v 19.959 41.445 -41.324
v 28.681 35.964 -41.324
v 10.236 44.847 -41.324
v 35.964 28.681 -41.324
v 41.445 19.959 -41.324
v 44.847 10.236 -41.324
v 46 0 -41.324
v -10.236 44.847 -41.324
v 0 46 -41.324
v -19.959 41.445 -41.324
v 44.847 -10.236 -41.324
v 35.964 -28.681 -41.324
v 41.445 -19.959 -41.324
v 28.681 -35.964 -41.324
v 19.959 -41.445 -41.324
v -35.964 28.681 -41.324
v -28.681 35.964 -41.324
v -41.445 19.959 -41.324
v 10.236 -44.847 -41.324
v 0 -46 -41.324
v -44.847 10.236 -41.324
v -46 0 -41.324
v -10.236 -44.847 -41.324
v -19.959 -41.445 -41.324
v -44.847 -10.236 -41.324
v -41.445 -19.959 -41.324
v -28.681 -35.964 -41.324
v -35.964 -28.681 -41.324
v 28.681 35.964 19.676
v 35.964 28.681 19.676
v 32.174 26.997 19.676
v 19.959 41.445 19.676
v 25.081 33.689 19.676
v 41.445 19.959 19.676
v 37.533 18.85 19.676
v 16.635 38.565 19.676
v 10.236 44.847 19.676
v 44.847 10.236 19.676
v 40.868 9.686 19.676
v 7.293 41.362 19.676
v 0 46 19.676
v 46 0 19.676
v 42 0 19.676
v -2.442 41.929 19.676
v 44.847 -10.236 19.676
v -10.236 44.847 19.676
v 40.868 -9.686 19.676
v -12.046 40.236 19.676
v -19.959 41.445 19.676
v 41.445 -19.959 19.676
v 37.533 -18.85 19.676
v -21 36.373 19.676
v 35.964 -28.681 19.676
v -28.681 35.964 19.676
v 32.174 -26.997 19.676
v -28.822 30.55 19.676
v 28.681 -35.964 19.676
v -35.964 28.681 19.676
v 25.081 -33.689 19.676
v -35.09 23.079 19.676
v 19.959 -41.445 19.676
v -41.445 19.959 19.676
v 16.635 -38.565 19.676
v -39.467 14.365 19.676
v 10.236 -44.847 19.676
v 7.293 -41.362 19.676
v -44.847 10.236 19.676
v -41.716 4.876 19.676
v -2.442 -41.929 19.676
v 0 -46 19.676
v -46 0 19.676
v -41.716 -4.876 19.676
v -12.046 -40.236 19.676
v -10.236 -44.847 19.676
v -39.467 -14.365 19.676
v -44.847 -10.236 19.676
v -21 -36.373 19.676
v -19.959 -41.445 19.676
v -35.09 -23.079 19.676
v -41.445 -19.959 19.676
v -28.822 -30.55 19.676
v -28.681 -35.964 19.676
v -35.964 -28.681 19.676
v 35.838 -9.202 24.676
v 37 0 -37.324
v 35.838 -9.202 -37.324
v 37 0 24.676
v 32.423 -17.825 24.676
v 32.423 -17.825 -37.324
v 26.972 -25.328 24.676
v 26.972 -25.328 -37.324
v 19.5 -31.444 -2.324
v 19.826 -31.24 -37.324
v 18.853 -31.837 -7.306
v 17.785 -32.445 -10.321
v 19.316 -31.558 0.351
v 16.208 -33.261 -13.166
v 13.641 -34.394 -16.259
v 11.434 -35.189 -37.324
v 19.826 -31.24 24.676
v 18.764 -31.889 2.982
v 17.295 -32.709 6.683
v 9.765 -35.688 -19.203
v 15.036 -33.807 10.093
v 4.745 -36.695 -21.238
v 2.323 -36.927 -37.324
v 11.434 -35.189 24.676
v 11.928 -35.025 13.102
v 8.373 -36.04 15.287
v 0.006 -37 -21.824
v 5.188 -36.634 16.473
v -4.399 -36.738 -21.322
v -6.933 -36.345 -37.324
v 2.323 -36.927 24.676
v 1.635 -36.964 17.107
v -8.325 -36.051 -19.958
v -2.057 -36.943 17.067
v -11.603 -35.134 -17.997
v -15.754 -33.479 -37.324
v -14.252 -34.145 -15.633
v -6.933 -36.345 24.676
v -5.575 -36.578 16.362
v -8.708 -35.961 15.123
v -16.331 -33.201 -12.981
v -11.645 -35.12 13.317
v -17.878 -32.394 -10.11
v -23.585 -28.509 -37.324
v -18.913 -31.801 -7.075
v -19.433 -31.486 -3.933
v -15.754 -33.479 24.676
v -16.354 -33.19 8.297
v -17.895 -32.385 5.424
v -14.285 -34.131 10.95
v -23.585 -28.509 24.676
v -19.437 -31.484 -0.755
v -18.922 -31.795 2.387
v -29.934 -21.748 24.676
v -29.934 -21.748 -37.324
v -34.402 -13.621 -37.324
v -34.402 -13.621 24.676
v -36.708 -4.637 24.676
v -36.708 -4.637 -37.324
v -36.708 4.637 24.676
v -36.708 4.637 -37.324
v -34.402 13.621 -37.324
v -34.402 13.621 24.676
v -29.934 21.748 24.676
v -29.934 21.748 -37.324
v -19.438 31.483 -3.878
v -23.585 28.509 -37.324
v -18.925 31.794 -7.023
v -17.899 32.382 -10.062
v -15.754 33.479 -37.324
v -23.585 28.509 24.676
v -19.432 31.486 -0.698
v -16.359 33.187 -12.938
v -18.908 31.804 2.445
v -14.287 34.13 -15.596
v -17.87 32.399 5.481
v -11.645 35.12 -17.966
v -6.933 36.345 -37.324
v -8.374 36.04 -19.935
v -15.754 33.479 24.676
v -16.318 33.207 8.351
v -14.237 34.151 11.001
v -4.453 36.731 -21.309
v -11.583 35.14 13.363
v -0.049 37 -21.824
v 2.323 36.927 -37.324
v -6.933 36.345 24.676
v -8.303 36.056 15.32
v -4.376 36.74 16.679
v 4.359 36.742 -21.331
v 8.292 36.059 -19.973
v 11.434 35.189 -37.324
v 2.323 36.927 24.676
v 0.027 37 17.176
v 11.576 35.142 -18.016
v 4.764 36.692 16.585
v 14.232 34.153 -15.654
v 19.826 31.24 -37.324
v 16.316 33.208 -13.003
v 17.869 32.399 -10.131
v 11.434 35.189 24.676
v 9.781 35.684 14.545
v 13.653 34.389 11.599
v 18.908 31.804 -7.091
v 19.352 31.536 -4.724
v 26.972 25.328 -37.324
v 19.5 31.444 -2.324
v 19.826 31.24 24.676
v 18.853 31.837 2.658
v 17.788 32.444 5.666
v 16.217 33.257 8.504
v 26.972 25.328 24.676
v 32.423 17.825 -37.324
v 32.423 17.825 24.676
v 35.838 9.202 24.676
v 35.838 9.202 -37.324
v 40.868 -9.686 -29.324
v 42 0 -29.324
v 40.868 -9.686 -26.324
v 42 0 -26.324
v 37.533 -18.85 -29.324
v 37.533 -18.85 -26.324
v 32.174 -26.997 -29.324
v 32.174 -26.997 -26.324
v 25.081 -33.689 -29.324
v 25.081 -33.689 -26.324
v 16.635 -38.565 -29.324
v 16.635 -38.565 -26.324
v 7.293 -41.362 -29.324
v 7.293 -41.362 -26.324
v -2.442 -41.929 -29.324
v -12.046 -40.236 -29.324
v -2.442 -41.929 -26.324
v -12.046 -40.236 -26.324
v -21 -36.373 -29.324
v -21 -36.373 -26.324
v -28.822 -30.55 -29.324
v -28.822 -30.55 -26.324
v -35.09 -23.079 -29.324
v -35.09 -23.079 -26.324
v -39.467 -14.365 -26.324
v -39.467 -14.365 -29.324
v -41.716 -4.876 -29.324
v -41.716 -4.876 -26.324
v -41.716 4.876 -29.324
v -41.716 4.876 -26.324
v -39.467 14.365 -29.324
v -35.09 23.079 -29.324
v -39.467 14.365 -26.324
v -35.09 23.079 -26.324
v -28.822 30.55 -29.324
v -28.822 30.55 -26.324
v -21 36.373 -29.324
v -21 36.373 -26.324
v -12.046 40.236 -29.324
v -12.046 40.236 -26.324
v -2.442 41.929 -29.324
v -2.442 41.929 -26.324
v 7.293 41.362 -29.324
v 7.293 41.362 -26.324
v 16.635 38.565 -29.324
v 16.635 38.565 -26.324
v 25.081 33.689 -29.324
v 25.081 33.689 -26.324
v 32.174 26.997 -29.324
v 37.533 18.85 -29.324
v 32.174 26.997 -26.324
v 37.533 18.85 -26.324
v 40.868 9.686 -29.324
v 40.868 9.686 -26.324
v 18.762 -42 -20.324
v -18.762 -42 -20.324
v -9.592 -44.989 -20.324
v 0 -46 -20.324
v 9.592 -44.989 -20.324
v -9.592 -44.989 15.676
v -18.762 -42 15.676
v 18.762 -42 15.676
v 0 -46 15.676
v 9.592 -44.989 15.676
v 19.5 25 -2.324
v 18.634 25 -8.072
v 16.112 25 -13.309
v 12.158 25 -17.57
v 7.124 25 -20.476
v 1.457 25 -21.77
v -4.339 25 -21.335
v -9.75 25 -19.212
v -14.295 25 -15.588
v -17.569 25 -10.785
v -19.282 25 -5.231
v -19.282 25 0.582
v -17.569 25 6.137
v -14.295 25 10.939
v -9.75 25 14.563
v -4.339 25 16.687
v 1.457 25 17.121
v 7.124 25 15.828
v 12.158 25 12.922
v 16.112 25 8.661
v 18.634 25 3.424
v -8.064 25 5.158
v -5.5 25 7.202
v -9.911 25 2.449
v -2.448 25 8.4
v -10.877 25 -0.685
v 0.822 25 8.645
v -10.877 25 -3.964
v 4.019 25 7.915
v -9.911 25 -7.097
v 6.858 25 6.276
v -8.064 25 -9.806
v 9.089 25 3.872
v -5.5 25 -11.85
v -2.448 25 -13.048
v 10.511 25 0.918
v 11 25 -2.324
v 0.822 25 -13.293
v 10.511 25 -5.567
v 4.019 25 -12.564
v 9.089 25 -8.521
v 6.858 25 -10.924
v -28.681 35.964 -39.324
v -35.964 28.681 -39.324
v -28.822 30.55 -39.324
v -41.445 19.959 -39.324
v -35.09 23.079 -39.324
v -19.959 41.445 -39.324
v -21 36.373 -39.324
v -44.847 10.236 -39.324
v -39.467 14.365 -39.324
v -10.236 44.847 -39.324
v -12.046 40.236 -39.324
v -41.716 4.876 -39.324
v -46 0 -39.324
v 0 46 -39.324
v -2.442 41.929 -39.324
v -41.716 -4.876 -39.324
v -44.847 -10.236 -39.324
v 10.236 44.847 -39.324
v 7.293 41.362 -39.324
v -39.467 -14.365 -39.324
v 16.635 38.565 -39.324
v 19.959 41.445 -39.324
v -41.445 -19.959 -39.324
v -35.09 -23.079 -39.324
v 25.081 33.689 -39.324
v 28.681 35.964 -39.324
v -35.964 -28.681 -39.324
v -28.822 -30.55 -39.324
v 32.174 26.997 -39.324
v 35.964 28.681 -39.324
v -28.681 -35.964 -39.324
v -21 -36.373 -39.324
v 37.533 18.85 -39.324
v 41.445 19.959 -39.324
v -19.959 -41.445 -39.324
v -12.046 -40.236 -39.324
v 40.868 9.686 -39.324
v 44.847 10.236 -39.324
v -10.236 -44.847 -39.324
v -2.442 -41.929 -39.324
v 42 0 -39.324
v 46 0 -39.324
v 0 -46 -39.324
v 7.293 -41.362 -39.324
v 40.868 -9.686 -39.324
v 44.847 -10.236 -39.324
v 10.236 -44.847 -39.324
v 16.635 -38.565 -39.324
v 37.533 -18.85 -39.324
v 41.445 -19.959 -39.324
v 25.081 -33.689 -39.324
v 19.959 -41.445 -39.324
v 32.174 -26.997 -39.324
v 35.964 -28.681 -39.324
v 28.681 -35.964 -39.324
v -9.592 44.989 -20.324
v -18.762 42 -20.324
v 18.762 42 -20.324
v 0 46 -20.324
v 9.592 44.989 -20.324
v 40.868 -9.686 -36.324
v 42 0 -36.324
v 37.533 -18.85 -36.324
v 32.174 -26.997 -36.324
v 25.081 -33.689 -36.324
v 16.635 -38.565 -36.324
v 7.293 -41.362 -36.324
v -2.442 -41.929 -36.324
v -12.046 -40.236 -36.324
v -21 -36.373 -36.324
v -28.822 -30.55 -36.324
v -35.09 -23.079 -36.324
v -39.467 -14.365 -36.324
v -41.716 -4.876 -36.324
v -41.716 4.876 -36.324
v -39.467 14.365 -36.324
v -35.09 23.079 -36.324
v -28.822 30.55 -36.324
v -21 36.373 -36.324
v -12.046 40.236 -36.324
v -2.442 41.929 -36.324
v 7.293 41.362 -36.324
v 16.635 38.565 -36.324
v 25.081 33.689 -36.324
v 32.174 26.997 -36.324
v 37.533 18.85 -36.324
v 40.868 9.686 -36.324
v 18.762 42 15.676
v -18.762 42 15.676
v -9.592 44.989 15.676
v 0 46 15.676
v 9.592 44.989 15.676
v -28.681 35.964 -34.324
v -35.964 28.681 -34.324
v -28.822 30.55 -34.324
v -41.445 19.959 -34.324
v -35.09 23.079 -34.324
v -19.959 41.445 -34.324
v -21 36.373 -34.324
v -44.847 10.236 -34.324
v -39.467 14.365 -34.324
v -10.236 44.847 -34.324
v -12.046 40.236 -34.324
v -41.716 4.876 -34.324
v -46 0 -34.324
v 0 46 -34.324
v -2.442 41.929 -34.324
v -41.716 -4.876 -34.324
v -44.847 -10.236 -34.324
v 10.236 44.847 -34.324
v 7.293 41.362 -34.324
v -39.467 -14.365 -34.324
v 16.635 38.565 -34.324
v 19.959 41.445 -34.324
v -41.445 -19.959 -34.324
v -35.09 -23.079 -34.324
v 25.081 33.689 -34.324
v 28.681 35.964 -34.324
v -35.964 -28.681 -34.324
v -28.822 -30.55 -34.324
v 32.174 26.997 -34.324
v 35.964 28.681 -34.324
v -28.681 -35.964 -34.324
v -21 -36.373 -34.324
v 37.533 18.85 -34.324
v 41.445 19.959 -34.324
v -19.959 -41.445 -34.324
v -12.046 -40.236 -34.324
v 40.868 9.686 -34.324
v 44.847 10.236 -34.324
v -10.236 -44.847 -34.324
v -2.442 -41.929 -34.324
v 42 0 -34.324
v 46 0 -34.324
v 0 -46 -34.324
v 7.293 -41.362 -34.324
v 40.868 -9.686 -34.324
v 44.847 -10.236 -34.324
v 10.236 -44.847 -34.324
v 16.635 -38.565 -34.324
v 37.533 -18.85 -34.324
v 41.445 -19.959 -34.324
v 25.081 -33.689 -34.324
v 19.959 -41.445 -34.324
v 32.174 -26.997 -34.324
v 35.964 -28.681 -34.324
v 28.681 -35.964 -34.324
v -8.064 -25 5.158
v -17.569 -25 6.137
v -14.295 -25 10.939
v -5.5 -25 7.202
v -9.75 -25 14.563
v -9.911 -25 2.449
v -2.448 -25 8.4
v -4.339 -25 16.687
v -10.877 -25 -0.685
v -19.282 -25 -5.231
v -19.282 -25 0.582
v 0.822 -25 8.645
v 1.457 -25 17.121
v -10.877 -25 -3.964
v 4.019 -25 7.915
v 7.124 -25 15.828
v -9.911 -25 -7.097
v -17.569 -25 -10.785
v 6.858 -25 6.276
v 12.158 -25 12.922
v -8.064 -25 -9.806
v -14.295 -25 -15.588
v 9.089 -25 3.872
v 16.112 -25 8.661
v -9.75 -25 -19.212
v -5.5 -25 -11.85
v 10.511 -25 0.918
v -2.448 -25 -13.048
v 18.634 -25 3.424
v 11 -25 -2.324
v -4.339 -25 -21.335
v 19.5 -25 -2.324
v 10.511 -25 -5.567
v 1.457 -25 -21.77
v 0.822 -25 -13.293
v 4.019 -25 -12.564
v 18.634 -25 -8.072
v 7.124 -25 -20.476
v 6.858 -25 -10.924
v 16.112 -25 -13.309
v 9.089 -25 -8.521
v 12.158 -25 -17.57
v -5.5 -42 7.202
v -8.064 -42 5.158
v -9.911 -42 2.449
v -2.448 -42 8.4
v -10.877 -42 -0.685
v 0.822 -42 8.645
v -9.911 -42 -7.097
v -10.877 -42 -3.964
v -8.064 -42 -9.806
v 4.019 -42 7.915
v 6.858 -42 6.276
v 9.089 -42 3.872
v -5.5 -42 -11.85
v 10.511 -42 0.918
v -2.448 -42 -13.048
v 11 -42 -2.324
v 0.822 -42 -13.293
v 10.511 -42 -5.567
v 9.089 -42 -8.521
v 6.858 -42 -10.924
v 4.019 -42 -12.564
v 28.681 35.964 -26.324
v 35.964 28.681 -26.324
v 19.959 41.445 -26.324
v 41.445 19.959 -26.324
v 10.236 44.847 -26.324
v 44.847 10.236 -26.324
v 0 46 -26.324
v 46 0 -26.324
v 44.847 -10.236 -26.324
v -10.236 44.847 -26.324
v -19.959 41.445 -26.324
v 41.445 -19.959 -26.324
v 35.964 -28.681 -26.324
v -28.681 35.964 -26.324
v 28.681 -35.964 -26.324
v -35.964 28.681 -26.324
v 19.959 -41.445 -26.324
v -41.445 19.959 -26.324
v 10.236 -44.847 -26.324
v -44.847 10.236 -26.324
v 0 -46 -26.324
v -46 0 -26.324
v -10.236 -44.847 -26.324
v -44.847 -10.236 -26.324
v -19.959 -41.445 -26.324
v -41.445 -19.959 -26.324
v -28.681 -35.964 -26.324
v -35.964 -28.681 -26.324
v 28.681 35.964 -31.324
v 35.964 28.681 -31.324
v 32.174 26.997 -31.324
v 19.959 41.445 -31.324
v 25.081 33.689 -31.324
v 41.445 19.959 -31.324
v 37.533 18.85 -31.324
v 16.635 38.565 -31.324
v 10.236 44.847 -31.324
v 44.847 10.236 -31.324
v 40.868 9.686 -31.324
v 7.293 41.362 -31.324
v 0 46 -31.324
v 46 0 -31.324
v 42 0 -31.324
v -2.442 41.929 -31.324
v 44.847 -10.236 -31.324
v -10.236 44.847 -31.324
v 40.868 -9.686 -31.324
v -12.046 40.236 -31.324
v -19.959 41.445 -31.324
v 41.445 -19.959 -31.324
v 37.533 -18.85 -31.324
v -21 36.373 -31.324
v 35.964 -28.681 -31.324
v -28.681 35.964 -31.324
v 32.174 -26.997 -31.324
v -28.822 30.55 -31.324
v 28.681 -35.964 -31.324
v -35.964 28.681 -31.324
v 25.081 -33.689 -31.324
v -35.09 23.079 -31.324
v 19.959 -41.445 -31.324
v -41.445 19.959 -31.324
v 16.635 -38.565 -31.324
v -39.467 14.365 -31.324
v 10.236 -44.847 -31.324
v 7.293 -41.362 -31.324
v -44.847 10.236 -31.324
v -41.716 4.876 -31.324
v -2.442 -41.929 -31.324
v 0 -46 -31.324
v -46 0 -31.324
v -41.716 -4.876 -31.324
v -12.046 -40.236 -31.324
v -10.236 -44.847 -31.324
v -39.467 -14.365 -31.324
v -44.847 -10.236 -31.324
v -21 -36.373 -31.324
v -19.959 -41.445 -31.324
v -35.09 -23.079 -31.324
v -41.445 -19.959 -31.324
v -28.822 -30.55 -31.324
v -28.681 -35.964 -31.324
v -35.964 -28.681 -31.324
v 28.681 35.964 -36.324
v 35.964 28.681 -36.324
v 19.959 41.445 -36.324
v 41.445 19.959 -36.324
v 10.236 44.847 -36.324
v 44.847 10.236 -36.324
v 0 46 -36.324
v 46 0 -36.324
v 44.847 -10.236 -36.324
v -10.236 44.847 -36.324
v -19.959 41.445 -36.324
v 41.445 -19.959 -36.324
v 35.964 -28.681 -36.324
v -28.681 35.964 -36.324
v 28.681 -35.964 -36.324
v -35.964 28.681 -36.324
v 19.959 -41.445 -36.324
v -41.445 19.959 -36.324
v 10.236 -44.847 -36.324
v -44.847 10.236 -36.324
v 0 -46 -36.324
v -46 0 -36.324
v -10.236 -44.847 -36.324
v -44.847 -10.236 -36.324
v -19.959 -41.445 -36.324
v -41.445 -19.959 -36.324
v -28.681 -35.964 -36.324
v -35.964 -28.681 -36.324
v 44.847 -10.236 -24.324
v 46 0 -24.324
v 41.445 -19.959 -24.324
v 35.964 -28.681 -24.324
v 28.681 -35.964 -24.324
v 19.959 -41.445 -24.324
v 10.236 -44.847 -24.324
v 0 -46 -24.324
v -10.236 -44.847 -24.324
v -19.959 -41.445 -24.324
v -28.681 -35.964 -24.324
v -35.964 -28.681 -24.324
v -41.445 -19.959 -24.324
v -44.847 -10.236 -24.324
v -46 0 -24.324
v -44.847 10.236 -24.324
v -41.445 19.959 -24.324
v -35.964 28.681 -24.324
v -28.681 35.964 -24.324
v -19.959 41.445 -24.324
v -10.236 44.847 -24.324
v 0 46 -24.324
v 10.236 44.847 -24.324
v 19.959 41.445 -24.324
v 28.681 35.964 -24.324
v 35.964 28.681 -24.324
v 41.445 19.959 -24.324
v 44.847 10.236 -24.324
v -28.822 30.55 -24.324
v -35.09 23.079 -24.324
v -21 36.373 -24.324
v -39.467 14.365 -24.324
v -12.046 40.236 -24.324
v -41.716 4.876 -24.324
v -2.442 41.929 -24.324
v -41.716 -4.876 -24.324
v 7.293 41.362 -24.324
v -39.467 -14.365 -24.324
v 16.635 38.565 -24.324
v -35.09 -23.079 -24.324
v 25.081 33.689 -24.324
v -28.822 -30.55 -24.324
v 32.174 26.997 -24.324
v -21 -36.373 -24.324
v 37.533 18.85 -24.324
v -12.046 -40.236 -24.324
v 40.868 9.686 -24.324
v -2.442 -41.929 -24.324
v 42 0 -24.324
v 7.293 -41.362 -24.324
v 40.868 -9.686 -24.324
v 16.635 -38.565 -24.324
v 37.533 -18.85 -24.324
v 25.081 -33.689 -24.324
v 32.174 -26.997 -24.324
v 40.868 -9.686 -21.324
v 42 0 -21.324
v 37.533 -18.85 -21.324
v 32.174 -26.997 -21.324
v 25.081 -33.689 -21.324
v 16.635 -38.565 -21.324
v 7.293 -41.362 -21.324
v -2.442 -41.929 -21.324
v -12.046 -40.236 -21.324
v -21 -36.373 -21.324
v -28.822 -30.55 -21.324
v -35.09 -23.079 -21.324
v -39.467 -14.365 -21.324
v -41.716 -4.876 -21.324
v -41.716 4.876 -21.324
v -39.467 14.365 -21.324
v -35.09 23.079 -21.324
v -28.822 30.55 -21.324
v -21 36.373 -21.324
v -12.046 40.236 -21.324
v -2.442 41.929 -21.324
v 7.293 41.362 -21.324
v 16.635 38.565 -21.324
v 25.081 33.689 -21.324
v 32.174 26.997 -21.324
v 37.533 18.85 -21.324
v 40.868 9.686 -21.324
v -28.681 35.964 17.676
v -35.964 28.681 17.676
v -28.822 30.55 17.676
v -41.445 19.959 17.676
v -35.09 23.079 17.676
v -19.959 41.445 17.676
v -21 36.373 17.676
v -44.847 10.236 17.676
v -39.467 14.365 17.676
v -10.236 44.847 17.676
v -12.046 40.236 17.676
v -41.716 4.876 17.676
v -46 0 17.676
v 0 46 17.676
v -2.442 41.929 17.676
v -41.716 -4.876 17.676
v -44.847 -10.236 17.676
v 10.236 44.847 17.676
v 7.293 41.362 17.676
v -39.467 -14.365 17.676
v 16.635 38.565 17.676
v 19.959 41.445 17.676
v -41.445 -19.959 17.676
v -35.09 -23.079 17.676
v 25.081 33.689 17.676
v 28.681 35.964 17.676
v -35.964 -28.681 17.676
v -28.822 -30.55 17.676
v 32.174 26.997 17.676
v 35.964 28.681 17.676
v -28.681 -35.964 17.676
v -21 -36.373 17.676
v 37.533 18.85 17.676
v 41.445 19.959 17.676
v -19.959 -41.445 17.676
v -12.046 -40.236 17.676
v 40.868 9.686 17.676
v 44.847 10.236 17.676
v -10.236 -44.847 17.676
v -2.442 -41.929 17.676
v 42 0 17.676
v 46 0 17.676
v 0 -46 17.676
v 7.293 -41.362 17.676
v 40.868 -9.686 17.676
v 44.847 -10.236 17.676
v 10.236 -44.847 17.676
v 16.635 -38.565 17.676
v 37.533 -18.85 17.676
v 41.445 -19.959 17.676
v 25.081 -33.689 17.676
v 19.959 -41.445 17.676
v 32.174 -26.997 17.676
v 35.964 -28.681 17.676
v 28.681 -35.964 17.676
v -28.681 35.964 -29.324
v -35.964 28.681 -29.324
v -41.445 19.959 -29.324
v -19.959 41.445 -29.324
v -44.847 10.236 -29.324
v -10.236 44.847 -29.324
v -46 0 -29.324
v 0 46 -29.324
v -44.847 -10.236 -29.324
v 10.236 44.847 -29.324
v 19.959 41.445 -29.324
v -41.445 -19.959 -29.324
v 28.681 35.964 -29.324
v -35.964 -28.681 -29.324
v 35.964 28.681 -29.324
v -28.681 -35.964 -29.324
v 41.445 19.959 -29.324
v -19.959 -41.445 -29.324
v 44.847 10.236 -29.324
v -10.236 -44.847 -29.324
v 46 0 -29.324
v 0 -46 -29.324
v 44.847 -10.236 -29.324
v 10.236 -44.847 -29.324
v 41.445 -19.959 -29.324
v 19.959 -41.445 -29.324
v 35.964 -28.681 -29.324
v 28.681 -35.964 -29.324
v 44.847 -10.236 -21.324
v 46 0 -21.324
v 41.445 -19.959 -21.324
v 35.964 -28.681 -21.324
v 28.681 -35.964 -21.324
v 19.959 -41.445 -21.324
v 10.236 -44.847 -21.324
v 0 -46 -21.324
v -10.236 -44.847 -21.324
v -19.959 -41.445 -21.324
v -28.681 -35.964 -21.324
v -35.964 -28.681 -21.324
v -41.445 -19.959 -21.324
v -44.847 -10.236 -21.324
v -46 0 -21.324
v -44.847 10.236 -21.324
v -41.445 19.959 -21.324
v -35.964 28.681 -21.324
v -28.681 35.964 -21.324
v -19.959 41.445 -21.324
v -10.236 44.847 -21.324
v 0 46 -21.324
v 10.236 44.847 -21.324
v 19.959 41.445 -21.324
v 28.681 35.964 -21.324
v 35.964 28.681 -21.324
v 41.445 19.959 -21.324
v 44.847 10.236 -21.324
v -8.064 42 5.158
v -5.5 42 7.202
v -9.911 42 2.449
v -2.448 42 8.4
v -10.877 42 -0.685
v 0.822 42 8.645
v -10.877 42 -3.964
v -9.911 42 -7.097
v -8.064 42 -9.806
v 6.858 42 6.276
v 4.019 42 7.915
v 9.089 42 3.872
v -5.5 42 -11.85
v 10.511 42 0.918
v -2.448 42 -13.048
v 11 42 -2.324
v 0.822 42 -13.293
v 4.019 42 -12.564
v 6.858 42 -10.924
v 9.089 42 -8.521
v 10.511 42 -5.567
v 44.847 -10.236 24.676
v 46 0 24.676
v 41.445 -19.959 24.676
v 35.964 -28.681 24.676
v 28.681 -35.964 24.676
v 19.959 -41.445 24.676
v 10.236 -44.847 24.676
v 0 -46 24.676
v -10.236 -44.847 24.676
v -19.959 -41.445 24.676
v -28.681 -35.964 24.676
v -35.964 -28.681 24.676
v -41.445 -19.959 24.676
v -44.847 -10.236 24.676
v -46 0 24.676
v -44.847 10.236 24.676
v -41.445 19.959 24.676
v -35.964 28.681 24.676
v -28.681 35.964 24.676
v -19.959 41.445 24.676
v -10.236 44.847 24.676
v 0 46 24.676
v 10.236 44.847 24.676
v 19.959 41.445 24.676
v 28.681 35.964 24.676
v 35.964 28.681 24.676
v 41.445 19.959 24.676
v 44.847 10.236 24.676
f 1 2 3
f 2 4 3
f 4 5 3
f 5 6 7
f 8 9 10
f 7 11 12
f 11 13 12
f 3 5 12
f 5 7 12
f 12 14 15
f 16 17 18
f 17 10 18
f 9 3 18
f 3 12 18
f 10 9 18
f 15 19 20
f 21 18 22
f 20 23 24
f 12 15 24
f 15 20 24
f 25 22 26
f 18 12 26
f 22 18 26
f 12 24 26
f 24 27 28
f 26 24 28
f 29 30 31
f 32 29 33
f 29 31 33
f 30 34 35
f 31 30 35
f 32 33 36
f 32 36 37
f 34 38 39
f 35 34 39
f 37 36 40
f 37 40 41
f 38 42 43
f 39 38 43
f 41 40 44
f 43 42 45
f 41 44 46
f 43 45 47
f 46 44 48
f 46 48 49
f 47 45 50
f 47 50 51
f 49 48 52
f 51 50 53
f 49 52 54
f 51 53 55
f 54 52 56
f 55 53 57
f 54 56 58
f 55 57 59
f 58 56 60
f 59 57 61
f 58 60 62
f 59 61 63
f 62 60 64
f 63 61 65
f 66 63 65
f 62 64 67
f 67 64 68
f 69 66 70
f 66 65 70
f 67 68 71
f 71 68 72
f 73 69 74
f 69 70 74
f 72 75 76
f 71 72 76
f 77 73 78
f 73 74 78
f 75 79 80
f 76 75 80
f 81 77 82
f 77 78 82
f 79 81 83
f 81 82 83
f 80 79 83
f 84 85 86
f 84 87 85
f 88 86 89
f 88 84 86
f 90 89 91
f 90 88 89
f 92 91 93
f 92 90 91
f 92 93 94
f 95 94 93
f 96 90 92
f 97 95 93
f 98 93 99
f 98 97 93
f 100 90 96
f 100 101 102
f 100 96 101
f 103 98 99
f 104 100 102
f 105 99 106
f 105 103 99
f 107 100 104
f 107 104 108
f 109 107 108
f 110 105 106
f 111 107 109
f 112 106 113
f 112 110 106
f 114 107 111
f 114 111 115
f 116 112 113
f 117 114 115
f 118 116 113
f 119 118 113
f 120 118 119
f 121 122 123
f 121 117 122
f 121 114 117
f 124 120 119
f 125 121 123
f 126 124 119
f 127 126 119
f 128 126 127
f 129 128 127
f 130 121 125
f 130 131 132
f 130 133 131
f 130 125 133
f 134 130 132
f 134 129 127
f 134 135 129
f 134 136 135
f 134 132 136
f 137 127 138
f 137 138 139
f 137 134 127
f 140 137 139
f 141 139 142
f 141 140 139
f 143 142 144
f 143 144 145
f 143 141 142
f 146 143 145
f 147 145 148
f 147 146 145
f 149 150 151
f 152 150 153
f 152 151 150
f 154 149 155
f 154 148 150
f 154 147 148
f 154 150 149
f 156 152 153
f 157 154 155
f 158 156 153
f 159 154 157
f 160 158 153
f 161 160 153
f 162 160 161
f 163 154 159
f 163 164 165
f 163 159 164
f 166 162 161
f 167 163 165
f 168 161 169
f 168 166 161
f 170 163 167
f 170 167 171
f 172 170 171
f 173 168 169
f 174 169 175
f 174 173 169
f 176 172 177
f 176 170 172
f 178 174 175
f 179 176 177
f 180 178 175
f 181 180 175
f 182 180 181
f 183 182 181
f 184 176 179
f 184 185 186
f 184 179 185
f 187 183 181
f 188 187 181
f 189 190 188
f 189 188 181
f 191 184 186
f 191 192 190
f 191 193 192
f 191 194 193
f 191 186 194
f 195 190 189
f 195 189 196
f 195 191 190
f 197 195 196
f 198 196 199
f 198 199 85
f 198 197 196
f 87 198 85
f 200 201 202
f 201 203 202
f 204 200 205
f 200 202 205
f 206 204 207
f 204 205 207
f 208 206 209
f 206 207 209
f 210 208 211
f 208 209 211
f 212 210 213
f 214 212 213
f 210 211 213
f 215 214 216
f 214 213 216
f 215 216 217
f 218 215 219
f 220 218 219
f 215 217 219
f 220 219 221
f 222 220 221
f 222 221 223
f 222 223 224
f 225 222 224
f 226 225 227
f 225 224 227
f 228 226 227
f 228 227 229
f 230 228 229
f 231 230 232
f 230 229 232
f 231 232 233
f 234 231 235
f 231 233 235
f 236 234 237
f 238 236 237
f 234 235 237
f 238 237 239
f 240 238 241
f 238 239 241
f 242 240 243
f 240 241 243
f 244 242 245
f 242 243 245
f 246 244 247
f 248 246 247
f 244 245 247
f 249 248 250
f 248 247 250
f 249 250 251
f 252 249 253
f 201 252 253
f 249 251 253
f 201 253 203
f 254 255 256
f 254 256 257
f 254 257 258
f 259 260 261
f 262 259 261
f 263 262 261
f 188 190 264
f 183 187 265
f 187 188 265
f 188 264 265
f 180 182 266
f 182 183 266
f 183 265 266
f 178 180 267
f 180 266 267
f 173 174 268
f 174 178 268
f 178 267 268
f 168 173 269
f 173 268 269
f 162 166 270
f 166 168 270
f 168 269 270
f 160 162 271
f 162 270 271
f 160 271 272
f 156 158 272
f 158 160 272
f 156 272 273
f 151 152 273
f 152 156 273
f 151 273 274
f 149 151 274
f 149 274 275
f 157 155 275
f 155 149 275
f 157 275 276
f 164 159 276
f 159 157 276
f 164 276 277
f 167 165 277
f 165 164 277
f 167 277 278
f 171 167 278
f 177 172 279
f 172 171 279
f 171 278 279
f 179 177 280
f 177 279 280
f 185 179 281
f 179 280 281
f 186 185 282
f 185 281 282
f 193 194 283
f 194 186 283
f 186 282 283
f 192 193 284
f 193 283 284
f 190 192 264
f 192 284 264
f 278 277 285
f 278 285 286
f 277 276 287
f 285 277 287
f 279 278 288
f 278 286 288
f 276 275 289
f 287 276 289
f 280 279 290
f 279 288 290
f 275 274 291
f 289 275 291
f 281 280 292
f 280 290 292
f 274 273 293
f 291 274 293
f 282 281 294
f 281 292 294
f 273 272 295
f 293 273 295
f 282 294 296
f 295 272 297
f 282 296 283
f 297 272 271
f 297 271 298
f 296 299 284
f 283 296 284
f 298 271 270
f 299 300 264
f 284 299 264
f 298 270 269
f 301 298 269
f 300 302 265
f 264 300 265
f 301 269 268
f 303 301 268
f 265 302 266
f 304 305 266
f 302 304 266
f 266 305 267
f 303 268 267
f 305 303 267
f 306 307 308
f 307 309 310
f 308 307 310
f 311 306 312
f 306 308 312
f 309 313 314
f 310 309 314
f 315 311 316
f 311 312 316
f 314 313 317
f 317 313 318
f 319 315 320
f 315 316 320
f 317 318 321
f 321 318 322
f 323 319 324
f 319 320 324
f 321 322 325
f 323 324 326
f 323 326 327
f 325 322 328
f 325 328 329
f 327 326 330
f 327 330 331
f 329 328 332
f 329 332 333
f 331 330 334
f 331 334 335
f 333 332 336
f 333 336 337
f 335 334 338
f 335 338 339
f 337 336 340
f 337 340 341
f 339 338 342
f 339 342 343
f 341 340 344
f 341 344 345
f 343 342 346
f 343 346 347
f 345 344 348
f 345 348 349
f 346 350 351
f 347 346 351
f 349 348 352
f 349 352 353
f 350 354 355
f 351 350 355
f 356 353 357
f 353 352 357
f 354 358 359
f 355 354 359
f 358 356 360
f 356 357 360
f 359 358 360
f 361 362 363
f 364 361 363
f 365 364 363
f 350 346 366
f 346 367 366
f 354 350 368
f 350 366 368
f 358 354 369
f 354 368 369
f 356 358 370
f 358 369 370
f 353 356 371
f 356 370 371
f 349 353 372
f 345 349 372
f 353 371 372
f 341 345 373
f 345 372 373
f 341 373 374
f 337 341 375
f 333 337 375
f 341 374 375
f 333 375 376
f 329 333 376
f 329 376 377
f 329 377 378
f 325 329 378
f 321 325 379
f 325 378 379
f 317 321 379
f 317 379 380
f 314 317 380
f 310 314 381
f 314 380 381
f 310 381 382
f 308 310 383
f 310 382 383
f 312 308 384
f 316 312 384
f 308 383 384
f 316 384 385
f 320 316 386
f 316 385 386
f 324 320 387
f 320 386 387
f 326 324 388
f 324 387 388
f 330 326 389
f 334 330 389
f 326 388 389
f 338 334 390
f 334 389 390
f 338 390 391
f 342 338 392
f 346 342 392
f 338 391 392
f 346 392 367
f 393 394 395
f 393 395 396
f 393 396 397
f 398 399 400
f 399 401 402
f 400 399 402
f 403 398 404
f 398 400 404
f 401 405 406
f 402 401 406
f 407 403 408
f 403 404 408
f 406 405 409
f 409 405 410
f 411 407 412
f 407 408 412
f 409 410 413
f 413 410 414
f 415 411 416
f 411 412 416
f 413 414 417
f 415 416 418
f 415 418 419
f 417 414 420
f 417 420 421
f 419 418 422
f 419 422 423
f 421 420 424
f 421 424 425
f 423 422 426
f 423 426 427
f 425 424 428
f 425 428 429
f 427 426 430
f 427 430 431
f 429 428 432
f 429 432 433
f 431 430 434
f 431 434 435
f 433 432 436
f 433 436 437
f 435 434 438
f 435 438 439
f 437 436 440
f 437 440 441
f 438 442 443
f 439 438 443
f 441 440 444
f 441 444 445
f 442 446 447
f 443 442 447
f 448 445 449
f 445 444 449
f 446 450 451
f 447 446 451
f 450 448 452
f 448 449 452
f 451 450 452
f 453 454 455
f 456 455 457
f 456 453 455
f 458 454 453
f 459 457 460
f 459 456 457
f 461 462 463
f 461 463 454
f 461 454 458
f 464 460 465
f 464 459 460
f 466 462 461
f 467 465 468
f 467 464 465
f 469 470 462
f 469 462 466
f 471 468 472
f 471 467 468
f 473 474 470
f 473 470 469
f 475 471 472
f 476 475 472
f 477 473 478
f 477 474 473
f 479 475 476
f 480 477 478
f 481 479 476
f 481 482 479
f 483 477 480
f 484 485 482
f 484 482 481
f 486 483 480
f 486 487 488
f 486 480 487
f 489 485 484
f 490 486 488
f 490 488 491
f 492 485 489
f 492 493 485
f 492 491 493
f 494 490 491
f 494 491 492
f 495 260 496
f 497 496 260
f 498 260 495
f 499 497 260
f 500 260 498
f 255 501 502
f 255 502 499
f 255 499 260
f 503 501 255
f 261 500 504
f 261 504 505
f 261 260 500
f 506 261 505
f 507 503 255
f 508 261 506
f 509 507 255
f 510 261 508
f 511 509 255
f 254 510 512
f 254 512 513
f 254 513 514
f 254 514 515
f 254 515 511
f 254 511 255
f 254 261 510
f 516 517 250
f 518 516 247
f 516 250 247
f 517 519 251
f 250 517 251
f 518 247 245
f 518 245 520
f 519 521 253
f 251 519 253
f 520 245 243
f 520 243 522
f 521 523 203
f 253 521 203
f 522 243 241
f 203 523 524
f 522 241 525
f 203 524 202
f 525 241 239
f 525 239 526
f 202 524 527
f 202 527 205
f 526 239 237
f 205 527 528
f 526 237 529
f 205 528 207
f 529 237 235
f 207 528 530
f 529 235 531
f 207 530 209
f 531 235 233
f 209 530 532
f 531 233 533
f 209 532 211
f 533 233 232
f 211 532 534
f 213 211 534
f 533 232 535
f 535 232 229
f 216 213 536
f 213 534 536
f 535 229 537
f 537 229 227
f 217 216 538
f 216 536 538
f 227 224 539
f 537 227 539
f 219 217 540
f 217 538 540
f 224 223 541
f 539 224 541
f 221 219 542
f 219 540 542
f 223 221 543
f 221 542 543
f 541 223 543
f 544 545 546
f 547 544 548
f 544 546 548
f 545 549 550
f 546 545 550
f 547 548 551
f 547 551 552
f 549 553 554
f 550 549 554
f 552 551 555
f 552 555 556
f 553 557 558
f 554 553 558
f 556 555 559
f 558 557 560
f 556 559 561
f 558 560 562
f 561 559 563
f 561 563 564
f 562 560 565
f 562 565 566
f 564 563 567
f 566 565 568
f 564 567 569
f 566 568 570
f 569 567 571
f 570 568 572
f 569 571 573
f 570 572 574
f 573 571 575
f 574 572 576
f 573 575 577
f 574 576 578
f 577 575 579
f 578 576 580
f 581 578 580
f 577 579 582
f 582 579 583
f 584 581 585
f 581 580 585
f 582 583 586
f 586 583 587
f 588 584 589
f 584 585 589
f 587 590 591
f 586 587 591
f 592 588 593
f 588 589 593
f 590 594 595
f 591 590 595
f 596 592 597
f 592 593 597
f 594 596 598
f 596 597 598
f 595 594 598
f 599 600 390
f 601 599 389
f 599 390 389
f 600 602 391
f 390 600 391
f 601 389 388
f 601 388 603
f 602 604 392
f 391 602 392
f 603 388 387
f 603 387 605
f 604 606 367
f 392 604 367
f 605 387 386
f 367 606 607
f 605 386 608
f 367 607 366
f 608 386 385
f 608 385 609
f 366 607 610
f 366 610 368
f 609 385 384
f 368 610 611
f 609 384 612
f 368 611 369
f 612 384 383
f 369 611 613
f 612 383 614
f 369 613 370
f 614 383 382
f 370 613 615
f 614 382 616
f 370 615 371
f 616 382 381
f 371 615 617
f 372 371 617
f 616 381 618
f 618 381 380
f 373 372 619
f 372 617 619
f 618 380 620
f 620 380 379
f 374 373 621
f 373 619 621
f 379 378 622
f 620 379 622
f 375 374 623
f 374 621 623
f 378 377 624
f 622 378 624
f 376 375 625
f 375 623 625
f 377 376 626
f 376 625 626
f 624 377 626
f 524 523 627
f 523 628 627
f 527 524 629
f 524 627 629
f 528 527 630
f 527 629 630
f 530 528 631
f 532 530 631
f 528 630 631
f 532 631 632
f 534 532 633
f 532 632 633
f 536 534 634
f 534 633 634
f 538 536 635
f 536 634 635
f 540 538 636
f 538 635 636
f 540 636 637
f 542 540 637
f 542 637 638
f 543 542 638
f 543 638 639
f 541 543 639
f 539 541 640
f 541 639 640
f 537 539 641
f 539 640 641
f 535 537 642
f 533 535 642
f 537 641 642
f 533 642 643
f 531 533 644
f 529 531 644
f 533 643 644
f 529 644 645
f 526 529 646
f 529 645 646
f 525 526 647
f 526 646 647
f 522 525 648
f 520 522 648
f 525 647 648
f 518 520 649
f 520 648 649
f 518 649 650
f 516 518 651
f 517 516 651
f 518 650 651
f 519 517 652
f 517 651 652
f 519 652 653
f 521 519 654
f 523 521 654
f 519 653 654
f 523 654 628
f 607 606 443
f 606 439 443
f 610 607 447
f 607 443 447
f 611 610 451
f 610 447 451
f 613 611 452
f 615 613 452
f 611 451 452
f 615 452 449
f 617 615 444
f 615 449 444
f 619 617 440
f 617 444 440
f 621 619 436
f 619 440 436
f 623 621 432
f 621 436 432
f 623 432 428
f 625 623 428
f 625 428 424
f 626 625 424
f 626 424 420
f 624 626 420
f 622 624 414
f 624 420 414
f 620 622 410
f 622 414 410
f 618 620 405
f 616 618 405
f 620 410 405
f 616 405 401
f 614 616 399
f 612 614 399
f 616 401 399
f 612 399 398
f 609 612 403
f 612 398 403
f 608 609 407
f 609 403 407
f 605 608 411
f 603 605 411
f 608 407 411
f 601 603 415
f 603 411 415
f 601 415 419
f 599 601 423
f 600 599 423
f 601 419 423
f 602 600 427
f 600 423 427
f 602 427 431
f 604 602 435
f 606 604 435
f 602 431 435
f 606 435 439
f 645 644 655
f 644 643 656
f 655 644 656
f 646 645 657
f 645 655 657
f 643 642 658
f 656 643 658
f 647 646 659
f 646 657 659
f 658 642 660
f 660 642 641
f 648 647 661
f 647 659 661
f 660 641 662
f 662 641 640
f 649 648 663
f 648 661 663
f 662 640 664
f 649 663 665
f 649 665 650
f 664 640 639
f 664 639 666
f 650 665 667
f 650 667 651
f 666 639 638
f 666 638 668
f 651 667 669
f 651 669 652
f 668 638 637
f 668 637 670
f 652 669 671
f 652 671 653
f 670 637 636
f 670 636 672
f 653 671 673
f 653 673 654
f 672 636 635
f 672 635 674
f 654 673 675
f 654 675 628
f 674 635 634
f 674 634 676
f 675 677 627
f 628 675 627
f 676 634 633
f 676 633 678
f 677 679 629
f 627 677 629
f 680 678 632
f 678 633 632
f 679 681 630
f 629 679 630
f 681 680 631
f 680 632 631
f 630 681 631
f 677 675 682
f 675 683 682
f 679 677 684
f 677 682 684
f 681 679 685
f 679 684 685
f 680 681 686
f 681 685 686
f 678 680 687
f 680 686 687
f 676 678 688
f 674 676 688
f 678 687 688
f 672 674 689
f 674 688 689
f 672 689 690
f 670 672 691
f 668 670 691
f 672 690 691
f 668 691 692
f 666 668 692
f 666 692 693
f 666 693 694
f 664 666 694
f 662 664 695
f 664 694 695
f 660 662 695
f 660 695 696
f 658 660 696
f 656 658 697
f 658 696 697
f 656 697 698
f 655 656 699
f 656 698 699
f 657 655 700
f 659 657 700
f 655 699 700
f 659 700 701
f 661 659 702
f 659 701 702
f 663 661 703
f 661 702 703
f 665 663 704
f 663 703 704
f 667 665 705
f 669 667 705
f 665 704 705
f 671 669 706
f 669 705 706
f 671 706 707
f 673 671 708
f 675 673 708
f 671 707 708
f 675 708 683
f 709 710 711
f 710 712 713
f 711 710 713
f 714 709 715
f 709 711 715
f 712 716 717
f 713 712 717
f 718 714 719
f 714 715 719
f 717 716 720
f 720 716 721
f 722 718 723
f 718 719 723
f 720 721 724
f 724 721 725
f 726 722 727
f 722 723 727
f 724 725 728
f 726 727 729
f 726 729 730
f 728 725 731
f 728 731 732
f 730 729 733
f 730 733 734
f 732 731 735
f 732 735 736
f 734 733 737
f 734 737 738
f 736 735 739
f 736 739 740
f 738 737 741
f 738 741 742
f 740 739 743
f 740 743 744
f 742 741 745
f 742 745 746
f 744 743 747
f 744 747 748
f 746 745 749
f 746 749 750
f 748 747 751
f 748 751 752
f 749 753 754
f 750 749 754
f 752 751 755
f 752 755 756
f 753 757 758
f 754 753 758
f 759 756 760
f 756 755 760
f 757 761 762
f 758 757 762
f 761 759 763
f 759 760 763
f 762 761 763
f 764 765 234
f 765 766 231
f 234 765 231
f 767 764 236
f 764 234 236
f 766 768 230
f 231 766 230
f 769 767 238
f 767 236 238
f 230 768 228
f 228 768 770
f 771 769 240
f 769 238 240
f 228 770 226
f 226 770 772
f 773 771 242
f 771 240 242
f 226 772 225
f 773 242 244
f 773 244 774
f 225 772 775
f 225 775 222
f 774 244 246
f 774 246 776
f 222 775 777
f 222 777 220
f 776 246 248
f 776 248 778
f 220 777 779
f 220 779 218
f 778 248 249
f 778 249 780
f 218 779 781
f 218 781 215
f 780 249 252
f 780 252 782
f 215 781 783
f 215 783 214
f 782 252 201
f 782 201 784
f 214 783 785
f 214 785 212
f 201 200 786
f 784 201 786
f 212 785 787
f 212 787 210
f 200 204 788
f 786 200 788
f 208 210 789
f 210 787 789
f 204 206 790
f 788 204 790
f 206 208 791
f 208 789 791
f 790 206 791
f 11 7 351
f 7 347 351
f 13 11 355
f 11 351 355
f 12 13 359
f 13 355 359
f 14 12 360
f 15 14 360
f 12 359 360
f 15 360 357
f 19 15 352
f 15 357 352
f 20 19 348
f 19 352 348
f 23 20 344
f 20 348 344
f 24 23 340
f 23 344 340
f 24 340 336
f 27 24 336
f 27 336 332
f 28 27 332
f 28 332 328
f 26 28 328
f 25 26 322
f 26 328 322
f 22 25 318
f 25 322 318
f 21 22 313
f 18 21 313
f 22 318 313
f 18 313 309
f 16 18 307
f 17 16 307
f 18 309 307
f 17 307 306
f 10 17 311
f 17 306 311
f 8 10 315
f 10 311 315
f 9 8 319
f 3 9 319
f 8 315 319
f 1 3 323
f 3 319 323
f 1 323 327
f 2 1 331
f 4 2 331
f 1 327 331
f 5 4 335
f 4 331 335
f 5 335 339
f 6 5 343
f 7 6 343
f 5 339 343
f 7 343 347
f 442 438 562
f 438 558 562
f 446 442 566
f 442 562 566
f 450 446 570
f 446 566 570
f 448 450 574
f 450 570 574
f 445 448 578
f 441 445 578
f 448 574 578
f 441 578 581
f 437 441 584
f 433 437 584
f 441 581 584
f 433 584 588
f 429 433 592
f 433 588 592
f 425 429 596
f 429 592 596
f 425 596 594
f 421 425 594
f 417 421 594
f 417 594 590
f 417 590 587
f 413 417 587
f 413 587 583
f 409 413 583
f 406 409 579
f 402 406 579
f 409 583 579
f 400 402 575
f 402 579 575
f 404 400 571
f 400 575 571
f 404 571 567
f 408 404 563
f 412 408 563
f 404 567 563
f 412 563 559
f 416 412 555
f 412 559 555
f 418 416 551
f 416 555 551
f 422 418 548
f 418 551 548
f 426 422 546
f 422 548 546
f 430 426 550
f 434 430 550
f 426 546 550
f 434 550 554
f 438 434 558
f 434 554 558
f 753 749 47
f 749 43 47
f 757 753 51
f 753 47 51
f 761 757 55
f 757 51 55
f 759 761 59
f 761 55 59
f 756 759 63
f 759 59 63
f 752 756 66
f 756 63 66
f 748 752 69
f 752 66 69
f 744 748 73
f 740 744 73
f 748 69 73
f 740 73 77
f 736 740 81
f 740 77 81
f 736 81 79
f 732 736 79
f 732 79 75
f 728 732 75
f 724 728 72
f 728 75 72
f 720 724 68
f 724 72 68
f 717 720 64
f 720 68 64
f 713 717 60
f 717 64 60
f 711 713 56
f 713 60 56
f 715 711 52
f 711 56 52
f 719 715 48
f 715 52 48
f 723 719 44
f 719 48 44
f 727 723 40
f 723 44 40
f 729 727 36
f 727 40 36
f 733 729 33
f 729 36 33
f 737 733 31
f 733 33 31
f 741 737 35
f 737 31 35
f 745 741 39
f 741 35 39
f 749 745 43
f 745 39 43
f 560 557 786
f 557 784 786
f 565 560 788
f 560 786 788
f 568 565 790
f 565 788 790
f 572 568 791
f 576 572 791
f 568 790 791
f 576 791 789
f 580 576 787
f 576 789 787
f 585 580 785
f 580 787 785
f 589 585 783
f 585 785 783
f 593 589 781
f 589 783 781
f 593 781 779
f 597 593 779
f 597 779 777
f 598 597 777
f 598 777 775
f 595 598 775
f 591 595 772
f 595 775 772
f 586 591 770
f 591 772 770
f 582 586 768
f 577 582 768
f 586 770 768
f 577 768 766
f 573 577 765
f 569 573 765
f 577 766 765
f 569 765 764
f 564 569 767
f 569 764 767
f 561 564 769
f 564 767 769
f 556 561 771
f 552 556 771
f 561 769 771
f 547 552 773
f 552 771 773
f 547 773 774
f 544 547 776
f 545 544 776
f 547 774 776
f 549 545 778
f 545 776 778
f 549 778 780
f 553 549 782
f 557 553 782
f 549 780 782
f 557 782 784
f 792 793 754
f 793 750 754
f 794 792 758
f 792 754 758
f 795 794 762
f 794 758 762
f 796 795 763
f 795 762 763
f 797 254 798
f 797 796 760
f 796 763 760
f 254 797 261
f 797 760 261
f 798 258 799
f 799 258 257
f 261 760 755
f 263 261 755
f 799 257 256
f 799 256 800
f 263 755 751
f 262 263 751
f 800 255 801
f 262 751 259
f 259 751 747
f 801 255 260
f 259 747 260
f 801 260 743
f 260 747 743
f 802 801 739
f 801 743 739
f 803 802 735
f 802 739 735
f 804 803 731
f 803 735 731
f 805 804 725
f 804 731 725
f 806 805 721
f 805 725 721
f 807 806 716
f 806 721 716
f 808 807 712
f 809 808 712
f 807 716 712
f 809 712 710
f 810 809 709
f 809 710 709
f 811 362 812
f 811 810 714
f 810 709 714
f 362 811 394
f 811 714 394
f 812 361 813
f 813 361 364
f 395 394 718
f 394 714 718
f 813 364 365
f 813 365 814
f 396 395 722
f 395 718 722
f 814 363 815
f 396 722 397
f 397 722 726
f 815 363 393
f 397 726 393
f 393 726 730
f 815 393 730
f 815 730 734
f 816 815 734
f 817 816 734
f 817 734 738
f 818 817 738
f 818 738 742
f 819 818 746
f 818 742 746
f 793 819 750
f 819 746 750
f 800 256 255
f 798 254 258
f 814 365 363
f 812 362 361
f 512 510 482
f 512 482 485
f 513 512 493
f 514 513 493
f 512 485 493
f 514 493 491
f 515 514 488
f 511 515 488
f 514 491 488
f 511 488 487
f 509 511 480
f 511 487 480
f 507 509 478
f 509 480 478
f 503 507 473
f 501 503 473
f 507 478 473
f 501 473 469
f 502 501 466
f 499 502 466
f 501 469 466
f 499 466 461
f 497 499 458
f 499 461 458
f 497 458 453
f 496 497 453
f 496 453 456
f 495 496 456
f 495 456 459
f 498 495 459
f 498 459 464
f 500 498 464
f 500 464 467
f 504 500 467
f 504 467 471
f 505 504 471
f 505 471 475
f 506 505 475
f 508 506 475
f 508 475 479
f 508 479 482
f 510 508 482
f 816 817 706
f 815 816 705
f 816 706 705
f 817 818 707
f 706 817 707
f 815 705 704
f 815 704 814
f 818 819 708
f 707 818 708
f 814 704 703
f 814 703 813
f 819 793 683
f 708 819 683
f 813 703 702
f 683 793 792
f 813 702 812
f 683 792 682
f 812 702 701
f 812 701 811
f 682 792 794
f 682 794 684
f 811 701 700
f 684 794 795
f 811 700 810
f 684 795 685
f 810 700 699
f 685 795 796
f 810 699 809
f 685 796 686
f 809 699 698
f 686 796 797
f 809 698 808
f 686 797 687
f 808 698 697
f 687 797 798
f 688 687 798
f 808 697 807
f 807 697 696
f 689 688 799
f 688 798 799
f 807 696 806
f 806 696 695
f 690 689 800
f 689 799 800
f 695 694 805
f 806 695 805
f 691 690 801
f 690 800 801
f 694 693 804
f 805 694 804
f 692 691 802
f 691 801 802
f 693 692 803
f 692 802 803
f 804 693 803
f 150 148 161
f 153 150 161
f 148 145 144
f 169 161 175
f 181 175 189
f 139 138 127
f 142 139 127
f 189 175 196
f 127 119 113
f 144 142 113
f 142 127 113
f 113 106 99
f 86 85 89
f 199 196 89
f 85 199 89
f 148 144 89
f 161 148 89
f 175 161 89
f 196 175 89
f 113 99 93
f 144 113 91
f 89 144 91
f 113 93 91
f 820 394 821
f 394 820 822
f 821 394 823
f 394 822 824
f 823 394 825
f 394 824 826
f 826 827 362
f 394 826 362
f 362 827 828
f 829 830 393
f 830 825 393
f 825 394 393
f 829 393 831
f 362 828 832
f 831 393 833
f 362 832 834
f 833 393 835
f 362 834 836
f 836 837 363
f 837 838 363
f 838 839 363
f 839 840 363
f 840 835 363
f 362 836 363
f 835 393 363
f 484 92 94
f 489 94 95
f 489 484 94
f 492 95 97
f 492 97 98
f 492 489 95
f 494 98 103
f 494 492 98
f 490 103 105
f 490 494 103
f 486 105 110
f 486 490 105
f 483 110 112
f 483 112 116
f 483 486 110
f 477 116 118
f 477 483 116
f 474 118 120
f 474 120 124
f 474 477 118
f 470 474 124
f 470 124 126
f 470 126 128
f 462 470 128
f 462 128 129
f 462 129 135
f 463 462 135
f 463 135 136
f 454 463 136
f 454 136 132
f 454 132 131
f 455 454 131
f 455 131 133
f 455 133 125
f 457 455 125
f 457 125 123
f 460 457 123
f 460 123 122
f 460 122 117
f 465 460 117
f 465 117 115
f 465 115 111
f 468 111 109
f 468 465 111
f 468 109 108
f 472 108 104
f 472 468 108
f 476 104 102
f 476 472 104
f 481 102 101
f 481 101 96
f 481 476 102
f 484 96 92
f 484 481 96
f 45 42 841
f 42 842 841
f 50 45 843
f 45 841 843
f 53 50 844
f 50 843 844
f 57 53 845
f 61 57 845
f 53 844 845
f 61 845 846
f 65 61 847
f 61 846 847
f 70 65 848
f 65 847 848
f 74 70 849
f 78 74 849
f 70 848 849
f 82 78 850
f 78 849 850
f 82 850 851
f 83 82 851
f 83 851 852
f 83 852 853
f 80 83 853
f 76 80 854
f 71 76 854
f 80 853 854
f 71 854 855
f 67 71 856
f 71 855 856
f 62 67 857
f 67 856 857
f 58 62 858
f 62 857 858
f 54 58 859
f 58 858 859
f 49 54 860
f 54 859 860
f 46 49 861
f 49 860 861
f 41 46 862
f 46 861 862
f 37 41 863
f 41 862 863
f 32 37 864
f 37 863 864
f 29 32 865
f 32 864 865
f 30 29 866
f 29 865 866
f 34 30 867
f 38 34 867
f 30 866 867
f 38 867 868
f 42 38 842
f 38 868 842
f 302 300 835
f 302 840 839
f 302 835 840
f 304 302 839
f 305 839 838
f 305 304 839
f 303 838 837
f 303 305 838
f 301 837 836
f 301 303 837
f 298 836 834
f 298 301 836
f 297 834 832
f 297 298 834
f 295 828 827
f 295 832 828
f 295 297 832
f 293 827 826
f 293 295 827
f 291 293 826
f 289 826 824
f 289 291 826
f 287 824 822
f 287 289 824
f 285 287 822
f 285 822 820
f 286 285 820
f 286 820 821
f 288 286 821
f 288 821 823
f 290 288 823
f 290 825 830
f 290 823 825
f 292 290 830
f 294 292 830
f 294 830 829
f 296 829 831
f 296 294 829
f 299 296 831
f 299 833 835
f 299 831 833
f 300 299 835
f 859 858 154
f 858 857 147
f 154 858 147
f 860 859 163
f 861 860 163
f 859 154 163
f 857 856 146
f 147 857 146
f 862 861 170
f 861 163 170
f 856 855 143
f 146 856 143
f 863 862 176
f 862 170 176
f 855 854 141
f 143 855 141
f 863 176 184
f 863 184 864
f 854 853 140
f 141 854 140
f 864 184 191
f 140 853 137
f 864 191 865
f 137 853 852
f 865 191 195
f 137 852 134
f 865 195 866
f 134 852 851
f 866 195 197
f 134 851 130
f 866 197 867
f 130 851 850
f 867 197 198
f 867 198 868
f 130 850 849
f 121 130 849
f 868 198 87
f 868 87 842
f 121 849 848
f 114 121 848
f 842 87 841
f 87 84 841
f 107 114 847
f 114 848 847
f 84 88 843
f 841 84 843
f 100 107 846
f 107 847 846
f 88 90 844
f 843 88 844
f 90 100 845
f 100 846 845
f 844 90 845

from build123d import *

# Parameters (mm, degrees)
SKETCH2_R               = 19.5
BOSS_EXTRUDE1_DEPTH     = 12
SKETCH3_R               = 11
CUT_EXTRUDE2_DEPTH      = 47
CUT_EXTRUDE2_DEPTH_BACK = 47
SKETCH7_W               = 36
SKETCH7_H               = 8
CUT_EXTRUDE4_DEPTH      = 47.0000001


with BuildPart() as part:
    # Sketch1 → Revolve1 (revolve)
    with BuildSketch(Plane(origin=(0, 0, 0), x_dir=(1, 0, 0), z_dir=(0, 1, 0))):
        Polygon((0, 41.324206049), (46, 41.324206049), (46, 39.324206049), (42, 39.324206049), (42, 36.324206049), (46, 36.324206049), (46, 34.324206049), (42, 34.324206049), (42, 31.324206049), (46, 31.324206049), (46, 29.324206049), (42, 29.324206049), (42, 26.324206049), (46, 26.324206049), (46, 24.324206049), (42, 24.324206049), (42, 21.324206049), (46, 21.324206049), (46, -17.675793951), (42, -17.675793951), (42, -19.675793951), (46, -19.675793951), (46, -24.675793951), (37, -24.675793951), (37, 22.858692986), (37, 37.324206049), (0, 37.324206049), align=None)
    revolve(axis=Axis((0, 0, 0), (0, 0, -1)))

    # Sketch2 → Boss-Extrude1 (add)
    with BuildSketch(Plane(origin=(0, 25, 0), x_dir=(1, 0, 0), z_dir=(0, 1, 0))):
        with Locations((0, 2.324206049)):
            Circle(SKETCH2_R)
    boss_extrude1 = extrude(amount=BOSS_EXTRUDE1_DEPTH)

    # Mirror1: Boss-Extrude1 across plane
    add(boss_extrude1.mirror(Plane.ZX))

    # Sketch3 → Cut-Extrude2 (cut, two sides)
    with BuildSketch(Plane(origin=(0, 0, 0), x_dir=(1, 0, 0), z_dir=(0, 1, 0))) as cut_extrude2_sk:
        with Locations((0, 2.324206049)):
            Circle(SKETCH3_R)
    extrude(amount=CUT_EXTRUDE2_DEPTH, mode=Mode.SUBTRACT)
    extrude(cut_extrude2_sk.sketch, amount=-CUT_EXTRUDE2_DEPTH_BACK, mode=Mode.SUBTRACT)

    # Sketch7 → Cut-Extrude4 (cut, symmetric)
    with BuildSketch(Plane(origin=(0, 0, 0), x_dir=(0, 0, -1), z_dir=(1, 0, 0))):
        with Locations((2.324206049, 46)):
            Rectangle(SKETCH7_W, SKETCH7_H)
    cut_extrude4 = extrude(amount=CUT_EXTRUDE4_DEPTH, both=True, mode=Mode.SUBTRACT)

    # Mirror2: Cut-Extrude4 across plane
    add(cut_extrude4.mirror(Plane.ZX), mode=Mode.SUBTRACT)


solid = part.part
